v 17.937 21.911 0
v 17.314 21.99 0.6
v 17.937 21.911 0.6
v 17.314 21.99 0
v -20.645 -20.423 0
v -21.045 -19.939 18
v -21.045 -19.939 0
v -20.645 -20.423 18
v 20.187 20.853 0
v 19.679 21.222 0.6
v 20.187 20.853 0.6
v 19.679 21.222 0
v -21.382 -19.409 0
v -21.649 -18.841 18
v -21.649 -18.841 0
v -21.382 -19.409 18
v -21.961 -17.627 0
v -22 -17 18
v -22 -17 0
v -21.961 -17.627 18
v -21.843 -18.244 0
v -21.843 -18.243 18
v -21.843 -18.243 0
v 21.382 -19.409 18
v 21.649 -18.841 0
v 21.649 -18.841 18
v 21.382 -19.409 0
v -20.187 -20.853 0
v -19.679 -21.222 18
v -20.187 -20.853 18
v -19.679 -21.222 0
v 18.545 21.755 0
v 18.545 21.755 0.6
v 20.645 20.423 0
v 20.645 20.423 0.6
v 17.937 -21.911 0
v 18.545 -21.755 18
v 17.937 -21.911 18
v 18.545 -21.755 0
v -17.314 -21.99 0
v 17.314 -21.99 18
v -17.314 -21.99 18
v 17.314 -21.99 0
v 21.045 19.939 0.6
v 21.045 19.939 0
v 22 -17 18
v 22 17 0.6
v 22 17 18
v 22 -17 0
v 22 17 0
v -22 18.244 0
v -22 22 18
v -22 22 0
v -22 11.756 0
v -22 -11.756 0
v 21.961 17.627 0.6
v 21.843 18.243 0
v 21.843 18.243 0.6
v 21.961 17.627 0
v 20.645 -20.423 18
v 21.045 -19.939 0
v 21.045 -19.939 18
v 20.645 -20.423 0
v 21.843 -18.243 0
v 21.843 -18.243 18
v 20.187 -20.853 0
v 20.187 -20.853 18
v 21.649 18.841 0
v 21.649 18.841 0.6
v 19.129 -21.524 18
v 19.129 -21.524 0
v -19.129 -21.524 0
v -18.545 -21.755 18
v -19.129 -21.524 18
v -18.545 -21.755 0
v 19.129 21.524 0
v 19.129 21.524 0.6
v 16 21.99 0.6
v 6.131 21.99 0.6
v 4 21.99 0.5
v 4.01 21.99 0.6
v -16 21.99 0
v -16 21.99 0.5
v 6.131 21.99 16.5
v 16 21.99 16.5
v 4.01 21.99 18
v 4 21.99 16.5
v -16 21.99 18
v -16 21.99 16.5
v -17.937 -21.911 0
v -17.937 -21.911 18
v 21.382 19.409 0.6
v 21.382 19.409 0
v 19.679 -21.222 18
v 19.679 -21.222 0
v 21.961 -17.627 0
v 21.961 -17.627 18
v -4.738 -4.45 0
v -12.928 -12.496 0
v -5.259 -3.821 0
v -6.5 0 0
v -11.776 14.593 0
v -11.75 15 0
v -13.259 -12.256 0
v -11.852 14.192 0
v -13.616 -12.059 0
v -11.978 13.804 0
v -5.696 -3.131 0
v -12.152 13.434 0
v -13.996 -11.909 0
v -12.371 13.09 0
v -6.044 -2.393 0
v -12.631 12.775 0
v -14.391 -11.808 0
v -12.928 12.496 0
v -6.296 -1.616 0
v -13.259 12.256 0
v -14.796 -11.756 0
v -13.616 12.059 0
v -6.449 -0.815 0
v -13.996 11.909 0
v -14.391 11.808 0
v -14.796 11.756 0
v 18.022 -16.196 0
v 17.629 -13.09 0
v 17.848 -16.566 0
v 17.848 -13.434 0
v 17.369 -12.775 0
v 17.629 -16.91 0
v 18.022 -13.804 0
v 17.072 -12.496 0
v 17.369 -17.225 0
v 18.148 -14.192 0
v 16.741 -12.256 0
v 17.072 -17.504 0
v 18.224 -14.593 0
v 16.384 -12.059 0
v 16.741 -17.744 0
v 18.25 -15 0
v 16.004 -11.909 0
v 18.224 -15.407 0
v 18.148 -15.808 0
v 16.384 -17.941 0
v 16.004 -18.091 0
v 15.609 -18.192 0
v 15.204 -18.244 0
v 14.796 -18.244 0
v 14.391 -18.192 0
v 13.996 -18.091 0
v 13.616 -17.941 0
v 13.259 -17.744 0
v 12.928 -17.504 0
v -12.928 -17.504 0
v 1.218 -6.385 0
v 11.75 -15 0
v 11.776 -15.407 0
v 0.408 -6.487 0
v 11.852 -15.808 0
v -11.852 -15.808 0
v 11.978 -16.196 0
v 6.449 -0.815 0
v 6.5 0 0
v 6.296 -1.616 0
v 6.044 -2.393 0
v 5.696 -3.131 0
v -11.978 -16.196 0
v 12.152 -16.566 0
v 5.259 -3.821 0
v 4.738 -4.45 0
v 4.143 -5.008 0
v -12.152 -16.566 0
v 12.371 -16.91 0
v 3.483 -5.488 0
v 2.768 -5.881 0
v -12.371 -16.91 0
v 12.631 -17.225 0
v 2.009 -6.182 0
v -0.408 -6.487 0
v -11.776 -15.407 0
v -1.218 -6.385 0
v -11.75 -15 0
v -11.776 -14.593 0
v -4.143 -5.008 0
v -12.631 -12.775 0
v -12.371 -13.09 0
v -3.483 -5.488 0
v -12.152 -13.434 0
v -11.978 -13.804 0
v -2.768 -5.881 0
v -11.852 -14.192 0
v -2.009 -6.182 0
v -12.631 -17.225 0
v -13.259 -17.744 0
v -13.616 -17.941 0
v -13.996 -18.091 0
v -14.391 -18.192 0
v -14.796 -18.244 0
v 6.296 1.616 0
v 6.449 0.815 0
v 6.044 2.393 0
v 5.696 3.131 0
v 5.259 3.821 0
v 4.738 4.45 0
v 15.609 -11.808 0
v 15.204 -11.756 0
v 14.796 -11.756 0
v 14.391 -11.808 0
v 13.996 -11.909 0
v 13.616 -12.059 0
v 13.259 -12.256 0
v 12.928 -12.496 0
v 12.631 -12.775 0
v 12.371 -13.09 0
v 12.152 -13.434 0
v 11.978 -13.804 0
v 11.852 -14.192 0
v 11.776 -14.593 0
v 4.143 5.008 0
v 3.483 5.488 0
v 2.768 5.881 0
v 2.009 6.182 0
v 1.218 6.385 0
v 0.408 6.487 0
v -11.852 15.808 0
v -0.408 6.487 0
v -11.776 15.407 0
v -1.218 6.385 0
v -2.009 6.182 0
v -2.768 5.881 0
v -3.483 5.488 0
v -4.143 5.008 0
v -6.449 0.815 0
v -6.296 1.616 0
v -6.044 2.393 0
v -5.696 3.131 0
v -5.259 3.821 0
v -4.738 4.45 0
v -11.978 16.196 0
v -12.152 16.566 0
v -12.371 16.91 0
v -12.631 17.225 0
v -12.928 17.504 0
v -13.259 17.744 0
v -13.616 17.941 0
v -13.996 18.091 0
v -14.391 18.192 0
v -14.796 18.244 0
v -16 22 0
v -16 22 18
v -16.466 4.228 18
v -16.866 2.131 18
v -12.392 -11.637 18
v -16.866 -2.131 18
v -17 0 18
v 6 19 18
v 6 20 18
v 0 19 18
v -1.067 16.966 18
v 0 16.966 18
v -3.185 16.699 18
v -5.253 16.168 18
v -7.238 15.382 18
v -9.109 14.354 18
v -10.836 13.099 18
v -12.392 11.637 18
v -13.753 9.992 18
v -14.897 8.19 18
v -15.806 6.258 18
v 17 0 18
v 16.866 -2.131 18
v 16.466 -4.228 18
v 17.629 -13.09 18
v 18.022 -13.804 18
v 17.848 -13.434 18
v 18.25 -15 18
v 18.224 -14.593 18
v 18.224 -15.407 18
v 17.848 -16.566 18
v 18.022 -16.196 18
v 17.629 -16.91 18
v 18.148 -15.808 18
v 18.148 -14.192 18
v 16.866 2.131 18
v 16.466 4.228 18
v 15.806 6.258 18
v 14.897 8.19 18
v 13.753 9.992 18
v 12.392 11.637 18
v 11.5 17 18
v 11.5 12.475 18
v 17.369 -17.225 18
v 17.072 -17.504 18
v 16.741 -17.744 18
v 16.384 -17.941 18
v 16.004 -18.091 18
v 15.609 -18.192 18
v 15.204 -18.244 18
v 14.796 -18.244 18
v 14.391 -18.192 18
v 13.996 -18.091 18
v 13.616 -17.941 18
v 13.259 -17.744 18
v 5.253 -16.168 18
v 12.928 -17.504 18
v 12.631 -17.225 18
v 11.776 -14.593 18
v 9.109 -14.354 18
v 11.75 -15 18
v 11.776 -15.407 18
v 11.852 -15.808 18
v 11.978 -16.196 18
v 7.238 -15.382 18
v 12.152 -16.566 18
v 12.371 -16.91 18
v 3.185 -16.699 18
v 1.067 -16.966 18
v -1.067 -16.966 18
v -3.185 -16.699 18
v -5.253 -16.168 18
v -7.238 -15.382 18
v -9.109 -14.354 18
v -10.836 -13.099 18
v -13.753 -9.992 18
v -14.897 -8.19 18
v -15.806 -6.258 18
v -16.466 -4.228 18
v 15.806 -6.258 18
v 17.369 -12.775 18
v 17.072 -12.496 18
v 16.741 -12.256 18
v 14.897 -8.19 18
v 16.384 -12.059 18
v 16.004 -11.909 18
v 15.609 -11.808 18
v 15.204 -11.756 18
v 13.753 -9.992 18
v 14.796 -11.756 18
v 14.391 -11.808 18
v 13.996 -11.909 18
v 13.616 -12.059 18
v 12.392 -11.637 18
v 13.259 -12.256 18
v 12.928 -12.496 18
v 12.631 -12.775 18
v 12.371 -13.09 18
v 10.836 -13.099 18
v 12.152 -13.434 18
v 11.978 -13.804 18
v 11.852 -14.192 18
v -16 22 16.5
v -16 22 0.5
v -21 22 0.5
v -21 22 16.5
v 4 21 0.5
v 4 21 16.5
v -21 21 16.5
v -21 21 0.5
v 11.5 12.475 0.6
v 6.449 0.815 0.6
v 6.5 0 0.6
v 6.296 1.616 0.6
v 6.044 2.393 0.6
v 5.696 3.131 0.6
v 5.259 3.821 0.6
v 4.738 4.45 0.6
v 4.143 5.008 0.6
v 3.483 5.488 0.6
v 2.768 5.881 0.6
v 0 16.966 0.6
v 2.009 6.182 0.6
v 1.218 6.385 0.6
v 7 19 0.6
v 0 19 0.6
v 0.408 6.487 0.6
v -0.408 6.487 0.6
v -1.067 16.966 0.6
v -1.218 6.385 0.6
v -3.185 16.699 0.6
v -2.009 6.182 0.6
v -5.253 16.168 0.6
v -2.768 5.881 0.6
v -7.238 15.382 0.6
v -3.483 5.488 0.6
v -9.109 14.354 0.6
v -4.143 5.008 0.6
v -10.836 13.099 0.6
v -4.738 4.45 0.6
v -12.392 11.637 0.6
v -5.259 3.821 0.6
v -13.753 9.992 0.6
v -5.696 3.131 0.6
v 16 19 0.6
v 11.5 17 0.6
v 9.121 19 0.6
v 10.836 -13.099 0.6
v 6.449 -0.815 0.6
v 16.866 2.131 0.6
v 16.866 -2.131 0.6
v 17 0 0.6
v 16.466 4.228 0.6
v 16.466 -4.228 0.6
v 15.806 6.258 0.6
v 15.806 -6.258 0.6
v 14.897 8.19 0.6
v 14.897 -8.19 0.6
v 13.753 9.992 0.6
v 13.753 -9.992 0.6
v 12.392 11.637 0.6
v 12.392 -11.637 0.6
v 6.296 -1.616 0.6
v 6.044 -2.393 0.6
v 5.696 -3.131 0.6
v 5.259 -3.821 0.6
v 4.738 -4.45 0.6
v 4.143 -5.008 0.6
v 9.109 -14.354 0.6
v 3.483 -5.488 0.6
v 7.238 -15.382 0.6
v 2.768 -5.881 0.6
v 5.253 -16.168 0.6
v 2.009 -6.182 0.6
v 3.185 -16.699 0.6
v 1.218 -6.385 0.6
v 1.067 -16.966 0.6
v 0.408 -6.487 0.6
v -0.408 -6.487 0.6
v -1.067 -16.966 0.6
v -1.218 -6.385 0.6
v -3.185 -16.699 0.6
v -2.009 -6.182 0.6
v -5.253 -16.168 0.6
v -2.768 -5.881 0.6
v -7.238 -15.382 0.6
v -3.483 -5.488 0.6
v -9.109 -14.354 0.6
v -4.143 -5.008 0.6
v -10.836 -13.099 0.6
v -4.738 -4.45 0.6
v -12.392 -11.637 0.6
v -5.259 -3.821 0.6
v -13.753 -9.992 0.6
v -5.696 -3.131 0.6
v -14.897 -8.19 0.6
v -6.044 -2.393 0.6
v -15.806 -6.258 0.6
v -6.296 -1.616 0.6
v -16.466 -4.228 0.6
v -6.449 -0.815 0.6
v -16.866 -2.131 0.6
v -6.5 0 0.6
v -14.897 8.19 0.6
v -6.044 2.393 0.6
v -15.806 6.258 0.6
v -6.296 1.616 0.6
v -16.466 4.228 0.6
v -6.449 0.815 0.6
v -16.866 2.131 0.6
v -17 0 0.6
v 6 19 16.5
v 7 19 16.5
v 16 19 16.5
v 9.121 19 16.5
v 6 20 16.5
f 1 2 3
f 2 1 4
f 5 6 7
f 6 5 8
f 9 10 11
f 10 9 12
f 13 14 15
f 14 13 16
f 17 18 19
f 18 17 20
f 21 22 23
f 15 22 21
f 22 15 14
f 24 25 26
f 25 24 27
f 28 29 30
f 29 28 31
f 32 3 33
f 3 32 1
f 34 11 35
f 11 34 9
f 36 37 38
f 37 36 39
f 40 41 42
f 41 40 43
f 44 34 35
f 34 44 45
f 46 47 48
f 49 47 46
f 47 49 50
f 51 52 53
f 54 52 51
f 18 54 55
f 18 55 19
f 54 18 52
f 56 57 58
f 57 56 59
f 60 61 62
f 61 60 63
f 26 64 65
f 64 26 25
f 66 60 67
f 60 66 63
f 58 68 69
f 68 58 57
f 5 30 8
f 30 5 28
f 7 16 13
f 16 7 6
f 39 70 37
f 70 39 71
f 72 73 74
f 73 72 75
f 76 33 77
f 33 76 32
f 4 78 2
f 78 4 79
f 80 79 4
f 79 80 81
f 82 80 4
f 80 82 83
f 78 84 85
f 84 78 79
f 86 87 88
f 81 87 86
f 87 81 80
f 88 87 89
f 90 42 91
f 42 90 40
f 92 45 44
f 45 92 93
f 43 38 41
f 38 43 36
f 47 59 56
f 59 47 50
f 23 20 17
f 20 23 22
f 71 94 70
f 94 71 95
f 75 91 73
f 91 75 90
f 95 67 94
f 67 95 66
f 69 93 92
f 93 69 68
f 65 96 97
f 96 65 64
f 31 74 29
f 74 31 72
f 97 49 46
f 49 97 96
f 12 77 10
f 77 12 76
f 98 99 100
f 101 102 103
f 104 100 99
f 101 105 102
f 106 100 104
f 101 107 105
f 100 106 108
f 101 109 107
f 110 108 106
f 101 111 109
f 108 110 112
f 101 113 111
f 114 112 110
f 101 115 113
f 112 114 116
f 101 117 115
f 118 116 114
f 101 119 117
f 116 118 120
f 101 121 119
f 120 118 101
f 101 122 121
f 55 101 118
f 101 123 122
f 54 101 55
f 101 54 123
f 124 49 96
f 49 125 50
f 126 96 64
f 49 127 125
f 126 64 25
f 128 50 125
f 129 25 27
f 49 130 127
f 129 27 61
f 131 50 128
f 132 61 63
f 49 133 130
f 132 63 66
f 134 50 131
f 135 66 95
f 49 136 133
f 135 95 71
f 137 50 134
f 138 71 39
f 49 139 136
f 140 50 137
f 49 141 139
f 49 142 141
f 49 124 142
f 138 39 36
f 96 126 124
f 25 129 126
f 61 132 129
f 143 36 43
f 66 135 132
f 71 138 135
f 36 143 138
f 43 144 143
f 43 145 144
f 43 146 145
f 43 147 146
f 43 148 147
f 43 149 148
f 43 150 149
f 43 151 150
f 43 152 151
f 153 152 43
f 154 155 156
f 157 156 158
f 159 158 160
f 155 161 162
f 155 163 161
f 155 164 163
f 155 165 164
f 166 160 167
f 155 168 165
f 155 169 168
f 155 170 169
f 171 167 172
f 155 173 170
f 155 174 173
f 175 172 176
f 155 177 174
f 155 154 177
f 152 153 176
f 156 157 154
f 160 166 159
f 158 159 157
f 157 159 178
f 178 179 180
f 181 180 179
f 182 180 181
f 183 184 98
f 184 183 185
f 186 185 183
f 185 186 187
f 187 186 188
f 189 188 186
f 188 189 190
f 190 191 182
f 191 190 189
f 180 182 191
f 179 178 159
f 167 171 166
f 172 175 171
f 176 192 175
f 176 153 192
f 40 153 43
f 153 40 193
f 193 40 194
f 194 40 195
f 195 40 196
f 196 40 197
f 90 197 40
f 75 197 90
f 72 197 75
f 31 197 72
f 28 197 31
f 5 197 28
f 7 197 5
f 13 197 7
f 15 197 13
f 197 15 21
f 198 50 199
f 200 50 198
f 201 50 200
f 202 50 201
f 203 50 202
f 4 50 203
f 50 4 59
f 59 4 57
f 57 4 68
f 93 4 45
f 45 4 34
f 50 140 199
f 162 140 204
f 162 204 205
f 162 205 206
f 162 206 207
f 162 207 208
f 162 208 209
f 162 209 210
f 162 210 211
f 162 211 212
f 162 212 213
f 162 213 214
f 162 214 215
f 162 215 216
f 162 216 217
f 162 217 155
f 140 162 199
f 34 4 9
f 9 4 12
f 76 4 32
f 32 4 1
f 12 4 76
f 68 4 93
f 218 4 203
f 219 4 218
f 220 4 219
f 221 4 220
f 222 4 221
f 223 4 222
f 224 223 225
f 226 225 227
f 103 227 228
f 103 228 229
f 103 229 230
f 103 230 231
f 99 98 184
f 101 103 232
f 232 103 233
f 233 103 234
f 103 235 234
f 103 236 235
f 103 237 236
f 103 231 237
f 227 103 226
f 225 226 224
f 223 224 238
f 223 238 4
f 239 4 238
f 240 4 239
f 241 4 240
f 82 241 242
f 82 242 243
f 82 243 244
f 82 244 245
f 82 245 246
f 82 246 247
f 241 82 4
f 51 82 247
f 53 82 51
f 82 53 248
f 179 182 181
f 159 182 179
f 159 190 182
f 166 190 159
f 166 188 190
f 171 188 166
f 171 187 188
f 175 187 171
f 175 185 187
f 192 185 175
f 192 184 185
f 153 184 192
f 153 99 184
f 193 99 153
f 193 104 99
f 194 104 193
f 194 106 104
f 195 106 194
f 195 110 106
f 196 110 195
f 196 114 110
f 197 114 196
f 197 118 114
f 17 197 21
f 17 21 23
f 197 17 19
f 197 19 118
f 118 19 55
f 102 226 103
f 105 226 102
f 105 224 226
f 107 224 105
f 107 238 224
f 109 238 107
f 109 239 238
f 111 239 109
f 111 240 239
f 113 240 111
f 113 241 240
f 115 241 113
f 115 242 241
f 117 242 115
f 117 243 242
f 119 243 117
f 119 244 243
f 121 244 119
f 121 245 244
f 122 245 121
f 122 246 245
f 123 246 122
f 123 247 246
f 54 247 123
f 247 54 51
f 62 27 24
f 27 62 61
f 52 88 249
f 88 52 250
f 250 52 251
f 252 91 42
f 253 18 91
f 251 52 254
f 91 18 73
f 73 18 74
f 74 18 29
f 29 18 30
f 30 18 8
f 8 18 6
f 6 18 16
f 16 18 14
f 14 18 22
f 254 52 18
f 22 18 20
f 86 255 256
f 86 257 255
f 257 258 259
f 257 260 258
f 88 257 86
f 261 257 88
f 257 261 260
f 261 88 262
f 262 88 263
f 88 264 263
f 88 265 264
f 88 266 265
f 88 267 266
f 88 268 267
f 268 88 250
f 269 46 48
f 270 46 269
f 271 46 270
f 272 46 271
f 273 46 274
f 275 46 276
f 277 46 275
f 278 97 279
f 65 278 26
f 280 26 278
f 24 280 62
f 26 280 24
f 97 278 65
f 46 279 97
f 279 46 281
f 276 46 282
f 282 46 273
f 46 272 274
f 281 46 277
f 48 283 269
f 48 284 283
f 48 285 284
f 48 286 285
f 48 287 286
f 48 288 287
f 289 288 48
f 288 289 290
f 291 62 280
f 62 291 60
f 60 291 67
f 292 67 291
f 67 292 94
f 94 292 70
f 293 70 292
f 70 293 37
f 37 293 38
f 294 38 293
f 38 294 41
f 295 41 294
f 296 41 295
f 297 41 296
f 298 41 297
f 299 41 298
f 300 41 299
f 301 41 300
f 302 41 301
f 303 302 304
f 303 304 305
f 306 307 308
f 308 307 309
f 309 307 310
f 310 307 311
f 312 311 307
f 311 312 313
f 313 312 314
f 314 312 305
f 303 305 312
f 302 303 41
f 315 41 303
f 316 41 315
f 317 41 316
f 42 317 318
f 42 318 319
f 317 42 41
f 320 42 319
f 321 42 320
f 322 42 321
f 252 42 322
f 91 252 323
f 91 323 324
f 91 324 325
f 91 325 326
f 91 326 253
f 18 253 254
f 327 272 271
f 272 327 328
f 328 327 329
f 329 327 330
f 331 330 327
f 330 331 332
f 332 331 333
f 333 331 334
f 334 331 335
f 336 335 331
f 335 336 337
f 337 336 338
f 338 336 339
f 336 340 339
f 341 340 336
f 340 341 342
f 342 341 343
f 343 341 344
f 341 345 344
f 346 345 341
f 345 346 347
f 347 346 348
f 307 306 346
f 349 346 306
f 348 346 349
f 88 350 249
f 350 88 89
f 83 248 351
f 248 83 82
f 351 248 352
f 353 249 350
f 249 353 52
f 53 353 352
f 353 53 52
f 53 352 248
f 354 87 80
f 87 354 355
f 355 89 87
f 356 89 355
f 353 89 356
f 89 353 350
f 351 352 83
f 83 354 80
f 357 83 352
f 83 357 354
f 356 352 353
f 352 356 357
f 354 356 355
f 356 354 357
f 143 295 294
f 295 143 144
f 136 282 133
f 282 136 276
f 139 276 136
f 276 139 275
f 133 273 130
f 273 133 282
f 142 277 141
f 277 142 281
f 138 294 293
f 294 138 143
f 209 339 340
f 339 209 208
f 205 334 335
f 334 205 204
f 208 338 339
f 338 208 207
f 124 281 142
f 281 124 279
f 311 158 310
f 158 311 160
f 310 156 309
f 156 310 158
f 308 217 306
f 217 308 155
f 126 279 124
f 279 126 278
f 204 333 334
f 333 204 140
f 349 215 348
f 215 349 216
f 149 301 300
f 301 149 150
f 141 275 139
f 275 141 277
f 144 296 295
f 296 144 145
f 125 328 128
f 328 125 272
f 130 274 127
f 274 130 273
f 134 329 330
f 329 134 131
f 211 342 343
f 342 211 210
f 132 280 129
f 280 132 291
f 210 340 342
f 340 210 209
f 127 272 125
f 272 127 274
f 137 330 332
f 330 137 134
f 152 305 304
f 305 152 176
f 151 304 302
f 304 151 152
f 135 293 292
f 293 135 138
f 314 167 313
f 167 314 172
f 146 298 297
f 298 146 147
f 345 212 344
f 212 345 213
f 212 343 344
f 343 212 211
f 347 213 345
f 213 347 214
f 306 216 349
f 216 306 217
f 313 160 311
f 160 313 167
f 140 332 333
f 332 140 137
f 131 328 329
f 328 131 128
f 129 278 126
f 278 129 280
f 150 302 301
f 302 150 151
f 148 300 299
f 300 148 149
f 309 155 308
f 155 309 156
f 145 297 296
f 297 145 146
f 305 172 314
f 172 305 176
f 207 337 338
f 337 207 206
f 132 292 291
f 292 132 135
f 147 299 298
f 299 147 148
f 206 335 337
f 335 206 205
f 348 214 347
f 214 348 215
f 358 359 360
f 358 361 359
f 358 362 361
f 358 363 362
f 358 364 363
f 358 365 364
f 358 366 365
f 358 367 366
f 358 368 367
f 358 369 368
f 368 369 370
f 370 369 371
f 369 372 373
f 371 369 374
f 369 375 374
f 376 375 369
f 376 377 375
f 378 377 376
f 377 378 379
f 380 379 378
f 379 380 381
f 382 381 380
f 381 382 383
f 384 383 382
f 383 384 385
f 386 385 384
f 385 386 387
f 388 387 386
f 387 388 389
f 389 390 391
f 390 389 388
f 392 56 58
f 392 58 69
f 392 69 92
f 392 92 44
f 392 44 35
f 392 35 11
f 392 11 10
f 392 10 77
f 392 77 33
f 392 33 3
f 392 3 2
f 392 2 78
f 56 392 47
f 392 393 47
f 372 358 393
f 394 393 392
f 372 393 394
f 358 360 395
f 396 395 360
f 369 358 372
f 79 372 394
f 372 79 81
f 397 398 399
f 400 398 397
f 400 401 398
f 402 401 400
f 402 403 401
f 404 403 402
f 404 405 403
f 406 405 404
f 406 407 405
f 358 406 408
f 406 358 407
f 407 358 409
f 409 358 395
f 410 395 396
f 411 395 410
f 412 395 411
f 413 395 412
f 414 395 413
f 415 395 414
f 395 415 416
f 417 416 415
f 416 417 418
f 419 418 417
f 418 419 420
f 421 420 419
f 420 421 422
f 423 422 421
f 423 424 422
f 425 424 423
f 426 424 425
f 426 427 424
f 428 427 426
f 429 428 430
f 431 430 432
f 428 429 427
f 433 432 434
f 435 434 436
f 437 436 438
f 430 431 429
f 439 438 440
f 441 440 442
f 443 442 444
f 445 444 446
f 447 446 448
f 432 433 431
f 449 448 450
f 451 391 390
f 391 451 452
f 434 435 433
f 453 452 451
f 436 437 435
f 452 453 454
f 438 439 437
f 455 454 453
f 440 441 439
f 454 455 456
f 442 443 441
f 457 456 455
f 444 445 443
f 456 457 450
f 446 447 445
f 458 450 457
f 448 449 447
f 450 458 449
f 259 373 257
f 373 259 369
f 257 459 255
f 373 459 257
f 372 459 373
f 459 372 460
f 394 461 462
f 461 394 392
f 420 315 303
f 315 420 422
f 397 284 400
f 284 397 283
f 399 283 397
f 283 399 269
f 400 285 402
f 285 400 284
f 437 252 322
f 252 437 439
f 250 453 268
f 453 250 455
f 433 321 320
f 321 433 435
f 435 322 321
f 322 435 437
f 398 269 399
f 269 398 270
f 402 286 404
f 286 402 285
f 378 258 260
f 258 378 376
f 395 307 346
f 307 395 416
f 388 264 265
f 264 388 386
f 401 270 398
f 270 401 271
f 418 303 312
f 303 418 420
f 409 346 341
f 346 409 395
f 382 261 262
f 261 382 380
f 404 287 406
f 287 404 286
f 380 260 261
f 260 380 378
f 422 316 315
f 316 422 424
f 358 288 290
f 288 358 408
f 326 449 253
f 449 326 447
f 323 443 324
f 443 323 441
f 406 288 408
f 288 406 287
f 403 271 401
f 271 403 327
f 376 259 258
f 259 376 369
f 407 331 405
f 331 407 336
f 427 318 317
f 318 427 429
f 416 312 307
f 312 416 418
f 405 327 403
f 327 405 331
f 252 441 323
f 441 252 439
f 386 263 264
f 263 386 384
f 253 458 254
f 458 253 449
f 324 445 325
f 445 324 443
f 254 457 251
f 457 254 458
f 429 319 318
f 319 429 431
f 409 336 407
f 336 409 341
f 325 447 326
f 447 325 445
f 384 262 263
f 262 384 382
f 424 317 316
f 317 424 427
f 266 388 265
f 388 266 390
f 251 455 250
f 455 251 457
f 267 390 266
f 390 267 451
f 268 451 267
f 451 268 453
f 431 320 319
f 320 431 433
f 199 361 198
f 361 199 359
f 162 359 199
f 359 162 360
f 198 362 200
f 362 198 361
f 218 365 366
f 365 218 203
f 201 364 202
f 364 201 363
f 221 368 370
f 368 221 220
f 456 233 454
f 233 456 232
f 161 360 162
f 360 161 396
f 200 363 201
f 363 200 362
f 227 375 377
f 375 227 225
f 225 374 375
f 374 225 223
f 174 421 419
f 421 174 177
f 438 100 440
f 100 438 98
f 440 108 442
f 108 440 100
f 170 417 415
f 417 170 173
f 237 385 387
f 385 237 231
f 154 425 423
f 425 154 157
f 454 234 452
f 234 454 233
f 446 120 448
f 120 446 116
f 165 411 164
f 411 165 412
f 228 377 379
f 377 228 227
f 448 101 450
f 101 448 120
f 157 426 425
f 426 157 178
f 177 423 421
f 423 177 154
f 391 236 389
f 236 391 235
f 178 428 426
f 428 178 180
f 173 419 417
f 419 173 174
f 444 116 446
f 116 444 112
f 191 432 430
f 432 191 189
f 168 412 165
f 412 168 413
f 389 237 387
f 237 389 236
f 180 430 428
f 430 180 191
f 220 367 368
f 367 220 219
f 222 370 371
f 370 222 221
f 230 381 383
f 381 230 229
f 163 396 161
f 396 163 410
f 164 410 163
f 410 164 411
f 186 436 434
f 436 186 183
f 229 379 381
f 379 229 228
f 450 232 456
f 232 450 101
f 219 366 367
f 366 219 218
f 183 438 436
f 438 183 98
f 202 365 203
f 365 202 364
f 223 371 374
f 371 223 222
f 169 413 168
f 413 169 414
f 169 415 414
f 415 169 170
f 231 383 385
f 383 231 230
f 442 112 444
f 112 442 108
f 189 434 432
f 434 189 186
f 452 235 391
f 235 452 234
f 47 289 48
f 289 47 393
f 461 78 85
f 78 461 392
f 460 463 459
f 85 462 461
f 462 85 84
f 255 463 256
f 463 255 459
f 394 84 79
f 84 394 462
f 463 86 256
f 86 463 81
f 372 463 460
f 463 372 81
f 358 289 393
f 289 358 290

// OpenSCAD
$fn = 50;


difference() {
	union() {
		hull() {
			translate(v = [-17.0000000000, 17.0000000000, 0]) {
				cylinder(h = 18, r = 5);
			}
			translate(v = [17.0000000000, 17.0000000000, 0]) {
				cylinder(h = 18, r = 5);
			}
			translate(v = [-17.0000000000, -17.0000000000, 0]) {
				cylinder(h = 18, r = 5);
			}
			translate(v = [17.0000000000, -17.0000000000, 0]) {
				cylinder(h = 18, r = 5);
			}
		}
		translate(v = [-22.0000000000, 16.0000000000, 0]) {
			cube(size = [6, 6, 18]);
		}
	}
	union() {
		translate(v = [-22.5000000000, -15.0000000000, -250.0000000000]) {
			rotate(a = [0, 0, 0]) {
				difference() {
					union() {
						hull() {
							translate(v = [7.5000000000, 0, 0]) {
								cylinder(h = 250, r = 3.2500000000, r1 = 3.2500000000, r2 = 3.2500000000);
							}
							translate(v = [-7.5000000000, 0, 0]) {
								cylinder(h = 250, r = 3.2500000000, r1 = 3.2500000000, r2 = 3.2500000000);
							}
						}
					}
					union();
				}
			}
		}
		translate(v = [-22.5000000000, 15.0000000000, -250.0000000000]) {
			rotate(a = [0, 0, 0]) {
				difference() {
					union() {
						hull() {
							translate(v = [7.5000000000, 0, 0]) {
								cylinder(h = 250, r = 3.2500000000, r1 = 3.2500000000, r2 = 3.2500000000);
							}
							translate(v = [-7.5000000000, 0, 0]) {
								cylinder(h = 250, r = 3.2500000000, r1 = 3.2500000000, r2 = 3.2500000000);
							}
						}
					}
					union();
				}
			}
		}
		translate(v = [-21.0000000000, 21.0000000000, 0.5000000000]) {
			cube(size = [25, 1, 16]);
		}
		translate(v = [15.0000000000, -15.0000000000, -50.0000000000]) {
			cylinder(h = 100, r = 3.2500000000);
		}
		translate(v = [0.0000000000, 11.0000000000, 0.6000000000]) {
			cube(size = [11, 8, 20.4000000000]);
		}
		translate(v = [0, 0, 0.6000000000]) {
			cylinder(h = 20.4000000000, r = 17.0000000000);
		}
		translate(v = [0, 0, -9.0000000000]) {
			cylinder(h = 18, r = 6.5000000000);
		}
		translate(v = [0.0000000000, 17.0000000000, 0.6000000000]) {
			cube(size = [22.0000000000, 2, 20.4000000000]);
		}
		translate(v = [16.0000000000, 17.0000000000, 0.6000000000]) {
			cube(size = [6, 5, 20.4000000000]);
		}
		translate(v = [6.0000000000, 17.0000000000, 16.5000000000]) {
			cube(size = [16, 5, 1.5000000000]);
		}
		translate(v = [3.2500000000, 22.7500000000, 0.6000000000]) {
			rotate(a = [0, 0, -45]) {
				cube(size = [7.5000000000, 1.5000000000, 20.4000000000]);
			}
		}
		translate(v = [2.5000000000, 12.0000000000, 0.6000000000]) {
			cube(size = [9.0000000000, 5, 17.4000000000]);
		}
	}
}
